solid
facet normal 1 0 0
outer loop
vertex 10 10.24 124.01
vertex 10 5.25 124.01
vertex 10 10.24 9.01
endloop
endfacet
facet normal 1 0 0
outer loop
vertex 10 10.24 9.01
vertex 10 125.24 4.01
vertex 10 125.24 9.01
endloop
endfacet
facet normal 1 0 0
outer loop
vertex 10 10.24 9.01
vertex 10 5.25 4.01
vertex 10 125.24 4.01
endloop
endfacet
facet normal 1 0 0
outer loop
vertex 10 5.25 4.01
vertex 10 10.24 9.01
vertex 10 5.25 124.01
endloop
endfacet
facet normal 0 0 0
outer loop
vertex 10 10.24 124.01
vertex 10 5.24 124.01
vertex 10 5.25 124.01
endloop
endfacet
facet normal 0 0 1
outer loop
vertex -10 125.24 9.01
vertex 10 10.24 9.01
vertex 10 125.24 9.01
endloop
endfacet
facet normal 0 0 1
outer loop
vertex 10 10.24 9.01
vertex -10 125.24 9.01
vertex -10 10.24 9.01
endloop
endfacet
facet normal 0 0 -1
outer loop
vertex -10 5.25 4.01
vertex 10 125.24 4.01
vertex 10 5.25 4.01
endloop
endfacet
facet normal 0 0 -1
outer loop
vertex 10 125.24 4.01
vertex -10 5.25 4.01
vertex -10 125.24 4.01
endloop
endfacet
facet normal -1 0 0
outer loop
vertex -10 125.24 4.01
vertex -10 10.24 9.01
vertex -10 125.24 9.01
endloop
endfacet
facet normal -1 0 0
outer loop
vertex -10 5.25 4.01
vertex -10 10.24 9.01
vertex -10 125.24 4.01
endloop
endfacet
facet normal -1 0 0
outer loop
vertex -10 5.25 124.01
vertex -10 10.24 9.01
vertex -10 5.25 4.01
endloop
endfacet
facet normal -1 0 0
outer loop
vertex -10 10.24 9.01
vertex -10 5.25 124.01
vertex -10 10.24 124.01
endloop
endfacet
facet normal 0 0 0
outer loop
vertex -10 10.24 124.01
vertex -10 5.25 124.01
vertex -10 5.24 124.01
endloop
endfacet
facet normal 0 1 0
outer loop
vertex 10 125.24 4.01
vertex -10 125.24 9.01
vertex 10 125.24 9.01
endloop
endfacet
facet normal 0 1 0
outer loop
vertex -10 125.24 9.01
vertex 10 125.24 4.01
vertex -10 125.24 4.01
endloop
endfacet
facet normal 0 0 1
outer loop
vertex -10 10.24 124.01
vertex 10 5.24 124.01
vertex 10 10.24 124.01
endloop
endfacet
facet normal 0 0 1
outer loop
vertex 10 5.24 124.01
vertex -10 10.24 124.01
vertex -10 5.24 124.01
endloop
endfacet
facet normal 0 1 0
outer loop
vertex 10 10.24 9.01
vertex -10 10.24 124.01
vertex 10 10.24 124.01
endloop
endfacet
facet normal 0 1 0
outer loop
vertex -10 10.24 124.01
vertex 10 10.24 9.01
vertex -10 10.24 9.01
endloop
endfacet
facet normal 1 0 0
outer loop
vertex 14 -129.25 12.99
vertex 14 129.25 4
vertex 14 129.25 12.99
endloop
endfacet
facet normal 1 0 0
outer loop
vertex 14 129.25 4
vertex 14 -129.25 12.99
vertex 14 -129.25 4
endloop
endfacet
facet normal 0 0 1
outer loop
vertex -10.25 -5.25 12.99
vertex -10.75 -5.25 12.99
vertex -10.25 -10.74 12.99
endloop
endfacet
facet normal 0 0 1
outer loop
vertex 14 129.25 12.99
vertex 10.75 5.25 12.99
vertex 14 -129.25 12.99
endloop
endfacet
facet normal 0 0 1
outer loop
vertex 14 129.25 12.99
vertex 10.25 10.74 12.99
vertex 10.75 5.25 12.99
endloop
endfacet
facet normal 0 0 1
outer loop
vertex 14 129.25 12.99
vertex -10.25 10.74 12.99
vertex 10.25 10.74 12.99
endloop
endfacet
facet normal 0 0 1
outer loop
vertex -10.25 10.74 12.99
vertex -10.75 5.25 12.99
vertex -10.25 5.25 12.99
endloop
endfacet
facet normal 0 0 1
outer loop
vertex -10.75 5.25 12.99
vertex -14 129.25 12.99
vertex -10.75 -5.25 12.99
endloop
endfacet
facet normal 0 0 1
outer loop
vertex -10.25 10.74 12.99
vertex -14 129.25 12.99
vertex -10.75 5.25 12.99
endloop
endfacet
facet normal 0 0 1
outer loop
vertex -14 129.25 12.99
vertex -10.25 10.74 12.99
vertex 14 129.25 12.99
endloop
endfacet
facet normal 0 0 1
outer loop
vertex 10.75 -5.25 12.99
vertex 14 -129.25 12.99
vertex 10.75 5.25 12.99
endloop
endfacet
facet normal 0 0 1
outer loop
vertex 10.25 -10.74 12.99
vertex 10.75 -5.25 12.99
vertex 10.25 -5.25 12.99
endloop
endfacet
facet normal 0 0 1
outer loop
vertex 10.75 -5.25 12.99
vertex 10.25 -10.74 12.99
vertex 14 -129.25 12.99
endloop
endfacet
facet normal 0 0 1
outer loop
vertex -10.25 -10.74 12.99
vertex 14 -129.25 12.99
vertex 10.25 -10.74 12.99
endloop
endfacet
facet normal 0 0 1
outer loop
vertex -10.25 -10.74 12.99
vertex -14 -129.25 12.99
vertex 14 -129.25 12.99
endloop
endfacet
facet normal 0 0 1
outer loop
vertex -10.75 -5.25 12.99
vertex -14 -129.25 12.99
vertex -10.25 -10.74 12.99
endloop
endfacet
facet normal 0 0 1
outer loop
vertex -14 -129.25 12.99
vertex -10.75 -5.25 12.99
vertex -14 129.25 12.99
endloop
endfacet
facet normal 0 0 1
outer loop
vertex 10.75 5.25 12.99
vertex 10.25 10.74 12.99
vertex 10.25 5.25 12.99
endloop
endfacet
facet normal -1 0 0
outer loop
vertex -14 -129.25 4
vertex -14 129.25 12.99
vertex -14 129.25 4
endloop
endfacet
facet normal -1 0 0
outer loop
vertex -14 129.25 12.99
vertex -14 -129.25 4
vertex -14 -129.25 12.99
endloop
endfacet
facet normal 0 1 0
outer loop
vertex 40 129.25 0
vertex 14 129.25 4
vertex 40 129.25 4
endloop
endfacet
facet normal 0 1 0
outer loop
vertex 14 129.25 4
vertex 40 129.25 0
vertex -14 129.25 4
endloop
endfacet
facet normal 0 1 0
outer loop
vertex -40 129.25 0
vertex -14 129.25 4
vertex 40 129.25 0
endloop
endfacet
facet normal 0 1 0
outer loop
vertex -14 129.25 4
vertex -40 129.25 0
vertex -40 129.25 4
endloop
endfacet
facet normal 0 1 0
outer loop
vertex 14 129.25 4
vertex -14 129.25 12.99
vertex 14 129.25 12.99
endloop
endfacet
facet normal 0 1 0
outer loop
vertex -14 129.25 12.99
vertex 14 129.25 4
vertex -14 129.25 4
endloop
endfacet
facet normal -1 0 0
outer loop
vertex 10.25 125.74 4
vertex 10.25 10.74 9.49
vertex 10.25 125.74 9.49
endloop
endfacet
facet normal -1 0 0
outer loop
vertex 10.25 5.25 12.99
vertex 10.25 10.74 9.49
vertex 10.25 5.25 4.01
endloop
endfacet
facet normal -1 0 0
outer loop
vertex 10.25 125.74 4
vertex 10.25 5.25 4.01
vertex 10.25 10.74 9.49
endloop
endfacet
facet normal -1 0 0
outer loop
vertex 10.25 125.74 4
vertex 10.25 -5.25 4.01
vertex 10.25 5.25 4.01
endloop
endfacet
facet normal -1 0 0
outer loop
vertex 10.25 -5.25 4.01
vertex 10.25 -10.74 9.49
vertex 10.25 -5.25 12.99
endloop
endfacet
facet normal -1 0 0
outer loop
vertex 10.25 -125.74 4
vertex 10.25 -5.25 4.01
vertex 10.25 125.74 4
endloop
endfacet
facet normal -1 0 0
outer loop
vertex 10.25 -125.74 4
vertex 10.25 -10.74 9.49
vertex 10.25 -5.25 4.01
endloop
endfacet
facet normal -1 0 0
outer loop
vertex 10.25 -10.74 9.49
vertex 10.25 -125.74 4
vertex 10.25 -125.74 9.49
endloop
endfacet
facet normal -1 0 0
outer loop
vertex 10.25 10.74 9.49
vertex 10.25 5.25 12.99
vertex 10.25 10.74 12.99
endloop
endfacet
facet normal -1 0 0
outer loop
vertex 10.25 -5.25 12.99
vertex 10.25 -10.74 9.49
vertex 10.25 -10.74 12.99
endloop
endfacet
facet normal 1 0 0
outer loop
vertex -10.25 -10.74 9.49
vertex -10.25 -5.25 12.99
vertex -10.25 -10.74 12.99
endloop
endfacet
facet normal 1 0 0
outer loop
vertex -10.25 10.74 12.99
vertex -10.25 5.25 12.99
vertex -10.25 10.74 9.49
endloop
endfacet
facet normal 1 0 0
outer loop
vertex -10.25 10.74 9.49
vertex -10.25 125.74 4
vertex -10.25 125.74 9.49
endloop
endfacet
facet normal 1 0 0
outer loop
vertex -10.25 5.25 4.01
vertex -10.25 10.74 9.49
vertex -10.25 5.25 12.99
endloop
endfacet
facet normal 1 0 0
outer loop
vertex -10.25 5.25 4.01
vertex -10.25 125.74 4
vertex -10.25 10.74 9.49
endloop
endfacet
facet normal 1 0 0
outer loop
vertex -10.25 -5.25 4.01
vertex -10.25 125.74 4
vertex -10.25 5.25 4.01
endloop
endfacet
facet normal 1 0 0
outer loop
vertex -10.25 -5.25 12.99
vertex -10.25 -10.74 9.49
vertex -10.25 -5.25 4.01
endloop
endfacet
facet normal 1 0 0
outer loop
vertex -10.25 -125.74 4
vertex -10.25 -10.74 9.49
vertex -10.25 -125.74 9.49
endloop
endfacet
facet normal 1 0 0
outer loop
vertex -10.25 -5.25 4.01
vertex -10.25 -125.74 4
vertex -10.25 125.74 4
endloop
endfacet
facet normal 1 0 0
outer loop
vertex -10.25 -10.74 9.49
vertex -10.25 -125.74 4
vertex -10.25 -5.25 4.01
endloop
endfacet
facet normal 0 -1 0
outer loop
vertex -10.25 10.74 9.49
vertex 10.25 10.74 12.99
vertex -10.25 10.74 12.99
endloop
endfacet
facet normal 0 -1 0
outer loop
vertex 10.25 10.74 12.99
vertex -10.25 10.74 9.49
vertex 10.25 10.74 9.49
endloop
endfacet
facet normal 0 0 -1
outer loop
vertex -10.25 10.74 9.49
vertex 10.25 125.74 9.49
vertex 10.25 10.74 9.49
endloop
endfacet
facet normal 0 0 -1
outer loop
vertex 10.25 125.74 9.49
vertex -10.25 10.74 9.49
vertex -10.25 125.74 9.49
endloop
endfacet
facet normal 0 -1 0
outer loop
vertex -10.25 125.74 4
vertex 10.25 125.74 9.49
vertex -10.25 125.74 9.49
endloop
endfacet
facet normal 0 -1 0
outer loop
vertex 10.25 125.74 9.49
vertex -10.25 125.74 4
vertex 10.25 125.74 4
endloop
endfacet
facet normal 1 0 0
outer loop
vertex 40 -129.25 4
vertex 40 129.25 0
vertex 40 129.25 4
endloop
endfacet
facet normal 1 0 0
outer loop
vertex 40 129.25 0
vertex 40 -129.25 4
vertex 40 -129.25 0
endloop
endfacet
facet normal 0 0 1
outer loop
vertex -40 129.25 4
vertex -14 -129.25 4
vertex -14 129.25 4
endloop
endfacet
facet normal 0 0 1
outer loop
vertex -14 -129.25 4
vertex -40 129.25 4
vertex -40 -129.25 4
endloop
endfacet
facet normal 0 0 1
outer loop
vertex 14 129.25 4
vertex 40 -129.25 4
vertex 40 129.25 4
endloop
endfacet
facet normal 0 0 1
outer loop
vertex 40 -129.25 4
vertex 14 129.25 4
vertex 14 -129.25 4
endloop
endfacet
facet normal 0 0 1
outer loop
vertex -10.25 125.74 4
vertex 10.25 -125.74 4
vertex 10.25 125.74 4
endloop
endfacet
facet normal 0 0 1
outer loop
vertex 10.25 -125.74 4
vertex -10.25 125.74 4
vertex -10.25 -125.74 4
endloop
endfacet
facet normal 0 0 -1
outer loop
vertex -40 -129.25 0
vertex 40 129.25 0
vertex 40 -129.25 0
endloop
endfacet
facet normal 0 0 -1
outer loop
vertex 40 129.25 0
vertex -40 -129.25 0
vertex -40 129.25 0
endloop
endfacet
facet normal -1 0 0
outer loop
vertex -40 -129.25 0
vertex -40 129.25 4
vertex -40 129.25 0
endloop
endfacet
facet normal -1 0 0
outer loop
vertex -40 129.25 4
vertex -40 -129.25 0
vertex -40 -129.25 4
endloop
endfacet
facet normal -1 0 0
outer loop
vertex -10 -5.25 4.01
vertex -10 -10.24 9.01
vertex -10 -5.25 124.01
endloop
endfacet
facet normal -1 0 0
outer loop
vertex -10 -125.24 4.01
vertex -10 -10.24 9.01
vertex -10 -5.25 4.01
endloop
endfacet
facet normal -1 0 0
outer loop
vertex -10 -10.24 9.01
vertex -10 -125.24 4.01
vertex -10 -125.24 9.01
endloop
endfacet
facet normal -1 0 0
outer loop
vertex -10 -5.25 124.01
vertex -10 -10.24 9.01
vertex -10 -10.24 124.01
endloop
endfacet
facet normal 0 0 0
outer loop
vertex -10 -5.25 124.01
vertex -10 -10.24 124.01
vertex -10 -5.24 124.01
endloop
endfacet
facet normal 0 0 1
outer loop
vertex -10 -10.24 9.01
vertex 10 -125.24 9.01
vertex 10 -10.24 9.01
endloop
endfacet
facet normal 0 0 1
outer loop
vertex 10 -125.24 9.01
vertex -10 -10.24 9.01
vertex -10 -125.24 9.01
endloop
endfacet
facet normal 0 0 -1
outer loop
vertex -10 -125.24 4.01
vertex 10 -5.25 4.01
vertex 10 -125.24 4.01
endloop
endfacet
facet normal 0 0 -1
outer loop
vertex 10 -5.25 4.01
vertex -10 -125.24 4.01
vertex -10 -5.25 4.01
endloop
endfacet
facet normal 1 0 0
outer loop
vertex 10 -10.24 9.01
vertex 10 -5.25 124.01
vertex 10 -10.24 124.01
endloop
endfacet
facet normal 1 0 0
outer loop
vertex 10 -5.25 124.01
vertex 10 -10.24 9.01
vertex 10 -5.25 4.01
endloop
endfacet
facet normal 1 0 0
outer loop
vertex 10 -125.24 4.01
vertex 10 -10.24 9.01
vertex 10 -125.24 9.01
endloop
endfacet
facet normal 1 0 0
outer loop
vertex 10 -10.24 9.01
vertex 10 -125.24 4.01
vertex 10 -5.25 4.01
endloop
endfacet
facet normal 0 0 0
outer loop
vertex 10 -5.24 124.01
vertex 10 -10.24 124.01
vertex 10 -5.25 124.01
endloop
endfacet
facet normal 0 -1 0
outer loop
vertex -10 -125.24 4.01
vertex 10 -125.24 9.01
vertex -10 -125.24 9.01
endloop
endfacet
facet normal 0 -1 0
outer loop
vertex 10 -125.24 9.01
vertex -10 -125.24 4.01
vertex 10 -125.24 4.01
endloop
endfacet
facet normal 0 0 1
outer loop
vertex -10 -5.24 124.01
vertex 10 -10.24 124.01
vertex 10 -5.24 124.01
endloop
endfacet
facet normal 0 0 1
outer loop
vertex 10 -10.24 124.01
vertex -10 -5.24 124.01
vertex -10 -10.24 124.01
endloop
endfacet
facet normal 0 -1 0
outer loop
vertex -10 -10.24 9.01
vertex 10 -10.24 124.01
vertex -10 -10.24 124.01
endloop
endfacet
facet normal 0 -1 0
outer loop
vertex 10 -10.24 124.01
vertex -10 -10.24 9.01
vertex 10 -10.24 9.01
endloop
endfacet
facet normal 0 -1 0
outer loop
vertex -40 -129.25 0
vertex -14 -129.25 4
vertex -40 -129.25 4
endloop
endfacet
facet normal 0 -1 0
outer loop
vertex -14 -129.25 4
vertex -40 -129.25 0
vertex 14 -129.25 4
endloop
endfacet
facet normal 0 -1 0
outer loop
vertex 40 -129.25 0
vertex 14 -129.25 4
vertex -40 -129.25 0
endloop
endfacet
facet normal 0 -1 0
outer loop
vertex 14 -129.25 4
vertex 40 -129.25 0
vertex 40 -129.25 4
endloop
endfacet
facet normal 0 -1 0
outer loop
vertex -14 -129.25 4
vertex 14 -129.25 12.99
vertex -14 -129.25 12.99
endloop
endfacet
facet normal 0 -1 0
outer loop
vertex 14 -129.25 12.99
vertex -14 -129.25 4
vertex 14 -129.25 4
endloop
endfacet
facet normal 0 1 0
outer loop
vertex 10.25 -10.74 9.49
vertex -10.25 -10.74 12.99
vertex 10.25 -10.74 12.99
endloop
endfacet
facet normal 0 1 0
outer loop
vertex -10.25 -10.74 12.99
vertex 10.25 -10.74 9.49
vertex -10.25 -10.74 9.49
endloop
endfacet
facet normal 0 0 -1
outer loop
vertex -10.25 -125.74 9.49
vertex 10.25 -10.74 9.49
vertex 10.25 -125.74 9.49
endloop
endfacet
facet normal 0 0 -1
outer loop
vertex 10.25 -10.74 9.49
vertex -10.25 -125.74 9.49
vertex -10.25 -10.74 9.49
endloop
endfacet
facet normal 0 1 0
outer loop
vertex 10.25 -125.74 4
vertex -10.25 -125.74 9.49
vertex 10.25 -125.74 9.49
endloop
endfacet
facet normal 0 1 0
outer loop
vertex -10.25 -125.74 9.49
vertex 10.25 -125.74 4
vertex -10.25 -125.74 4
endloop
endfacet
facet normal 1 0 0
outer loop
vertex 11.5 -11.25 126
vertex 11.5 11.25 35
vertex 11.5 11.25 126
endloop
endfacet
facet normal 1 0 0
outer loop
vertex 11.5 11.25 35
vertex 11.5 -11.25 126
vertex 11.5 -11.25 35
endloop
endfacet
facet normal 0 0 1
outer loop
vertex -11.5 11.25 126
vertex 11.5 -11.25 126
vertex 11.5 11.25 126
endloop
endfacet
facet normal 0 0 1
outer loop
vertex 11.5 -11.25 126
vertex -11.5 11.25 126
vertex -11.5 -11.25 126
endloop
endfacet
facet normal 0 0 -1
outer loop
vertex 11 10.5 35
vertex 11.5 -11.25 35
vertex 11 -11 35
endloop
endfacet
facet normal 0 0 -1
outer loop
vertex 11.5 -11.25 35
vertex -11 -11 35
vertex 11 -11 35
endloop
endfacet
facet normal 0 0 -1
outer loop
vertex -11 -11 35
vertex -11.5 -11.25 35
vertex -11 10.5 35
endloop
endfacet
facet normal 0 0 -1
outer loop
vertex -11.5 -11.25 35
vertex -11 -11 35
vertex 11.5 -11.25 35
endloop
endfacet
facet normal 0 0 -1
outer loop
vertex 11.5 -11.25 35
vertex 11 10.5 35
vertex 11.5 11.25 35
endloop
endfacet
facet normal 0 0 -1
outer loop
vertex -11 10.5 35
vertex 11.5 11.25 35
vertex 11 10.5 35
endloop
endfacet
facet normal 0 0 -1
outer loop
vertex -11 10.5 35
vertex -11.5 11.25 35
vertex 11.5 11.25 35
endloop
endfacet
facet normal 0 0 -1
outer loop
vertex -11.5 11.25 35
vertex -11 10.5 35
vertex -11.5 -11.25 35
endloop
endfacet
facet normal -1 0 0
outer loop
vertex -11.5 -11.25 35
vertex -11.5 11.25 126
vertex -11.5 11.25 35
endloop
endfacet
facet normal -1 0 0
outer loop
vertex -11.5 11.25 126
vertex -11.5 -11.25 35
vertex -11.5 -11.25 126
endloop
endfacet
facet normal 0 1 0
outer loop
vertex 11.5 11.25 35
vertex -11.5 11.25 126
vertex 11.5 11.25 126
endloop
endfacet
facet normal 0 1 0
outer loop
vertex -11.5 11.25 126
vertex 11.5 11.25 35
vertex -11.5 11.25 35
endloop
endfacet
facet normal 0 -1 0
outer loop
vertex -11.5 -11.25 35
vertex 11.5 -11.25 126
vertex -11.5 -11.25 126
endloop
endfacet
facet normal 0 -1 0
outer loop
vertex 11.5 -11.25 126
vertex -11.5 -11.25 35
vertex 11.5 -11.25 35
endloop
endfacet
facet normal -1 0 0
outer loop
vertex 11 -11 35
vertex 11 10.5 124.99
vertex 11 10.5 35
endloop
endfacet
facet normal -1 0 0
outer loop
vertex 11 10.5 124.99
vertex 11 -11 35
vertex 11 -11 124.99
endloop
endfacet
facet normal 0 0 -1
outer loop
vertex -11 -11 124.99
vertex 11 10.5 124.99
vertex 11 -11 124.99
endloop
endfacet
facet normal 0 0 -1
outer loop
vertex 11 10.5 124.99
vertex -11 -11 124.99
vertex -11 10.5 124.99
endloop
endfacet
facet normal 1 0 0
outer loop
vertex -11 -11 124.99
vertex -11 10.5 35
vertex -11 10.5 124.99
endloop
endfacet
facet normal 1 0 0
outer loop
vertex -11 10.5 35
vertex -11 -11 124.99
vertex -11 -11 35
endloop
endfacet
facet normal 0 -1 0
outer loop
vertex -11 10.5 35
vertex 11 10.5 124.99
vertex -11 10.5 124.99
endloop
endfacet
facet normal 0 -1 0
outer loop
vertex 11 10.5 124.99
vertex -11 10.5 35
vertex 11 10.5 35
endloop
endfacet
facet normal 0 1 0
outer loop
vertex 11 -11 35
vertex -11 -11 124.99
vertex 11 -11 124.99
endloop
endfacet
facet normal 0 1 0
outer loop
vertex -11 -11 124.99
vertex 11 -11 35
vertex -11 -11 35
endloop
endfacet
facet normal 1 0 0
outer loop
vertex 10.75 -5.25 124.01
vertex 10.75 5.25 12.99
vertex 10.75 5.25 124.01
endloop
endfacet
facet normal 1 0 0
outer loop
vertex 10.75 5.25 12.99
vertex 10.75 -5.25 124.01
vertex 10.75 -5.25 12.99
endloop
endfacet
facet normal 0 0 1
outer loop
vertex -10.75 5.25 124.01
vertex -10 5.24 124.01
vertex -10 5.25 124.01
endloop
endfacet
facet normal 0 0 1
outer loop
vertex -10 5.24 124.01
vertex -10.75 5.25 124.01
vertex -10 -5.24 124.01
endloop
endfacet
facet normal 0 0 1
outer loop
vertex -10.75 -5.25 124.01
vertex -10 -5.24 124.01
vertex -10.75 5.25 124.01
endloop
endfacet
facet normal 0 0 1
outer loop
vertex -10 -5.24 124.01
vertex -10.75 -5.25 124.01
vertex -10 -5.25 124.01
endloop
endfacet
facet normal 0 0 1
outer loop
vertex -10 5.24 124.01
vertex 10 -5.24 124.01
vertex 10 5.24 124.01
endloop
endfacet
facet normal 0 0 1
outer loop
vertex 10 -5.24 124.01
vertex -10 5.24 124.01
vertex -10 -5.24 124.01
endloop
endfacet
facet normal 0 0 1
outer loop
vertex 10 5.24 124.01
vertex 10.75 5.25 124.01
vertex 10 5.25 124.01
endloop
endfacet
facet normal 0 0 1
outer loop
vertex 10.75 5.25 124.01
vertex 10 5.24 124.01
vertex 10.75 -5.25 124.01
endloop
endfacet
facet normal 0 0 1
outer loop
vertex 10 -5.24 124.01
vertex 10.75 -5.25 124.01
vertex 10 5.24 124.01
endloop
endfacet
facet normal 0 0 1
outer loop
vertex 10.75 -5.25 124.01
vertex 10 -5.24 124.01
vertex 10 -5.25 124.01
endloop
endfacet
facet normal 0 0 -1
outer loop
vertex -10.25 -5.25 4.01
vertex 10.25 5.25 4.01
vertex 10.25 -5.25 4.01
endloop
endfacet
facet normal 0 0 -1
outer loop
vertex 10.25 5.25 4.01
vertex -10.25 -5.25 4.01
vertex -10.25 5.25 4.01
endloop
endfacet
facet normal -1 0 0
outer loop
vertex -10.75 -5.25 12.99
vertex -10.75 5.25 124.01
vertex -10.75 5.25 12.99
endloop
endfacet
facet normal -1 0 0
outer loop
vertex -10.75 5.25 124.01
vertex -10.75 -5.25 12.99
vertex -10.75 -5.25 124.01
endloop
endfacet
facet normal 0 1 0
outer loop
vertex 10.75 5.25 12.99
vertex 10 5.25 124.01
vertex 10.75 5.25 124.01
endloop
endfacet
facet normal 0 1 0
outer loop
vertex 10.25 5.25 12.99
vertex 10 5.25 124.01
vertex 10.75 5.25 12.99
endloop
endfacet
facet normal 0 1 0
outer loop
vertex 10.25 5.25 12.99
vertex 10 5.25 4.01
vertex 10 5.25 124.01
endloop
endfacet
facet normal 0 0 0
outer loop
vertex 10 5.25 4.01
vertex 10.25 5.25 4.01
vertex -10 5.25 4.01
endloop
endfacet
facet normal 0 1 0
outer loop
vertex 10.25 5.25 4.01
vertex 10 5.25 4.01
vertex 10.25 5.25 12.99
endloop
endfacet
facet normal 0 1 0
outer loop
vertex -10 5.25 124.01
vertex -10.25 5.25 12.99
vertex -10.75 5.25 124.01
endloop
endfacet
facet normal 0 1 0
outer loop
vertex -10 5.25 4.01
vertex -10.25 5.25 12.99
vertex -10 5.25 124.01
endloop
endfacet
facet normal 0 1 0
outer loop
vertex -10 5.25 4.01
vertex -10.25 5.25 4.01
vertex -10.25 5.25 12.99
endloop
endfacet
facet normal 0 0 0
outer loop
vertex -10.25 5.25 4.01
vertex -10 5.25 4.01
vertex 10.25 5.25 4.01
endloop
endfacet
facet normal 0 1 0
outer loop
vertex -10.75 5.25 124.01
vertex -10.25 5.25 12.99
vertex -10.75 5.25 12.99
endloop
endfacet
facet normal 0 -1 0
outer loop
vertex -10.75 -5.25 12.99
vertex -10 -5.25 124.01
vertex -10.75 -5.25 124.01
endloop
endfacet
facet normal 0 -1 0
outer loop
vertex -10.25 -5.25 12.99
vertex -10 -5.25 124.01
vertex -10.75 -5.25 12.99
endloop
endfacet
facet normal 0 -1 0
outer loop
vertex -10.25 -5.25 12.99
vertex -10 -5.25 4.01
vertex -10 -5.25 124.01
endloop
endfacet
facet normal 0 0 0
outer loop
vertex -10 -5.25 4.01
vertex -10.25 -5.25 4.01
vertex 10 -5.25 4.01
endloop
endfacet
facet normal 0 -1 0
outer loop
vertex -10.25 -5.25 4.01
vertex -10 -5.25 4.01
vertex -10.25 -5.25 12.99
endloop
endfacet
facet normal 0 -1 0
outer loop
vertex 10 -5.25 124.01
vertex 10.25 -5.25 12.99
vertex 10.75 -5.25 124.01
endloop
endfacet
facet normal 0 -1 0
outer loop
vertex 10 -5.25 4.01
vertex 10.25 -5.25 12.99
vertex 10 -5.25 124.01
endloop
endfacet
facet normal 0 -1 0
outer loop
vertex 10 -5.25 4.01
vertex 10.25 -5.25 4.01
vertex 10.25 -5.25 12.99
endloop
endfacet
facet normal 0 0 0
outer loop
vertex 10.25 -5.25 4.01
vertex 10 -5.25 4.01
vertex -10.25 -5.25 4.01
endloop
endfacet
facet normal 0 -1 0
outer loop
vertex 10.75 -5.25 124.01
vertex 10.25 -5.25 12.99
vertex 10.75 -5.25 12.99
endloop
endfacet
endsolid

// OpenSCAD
// file: monitor.scad
include <config.scad>;

module monitor_socket() {
    color([1, 1, 1, 0.6]) {
        difference() {
            // Block incl. walls
            wx_outer = monitor_socket_widthx + monitor_socket_thickness;
            wy_outer = monitor_socket_widthy + monitor_socket_thickness;
            translate([
                -wx_outer/2,
                -wy_outer/2,
                0
                ])
            cube([
                wx_outer,
                wy_outer,
                monitor_socket_height + monitor_socket_thickness
                ]);

            // Hole
            translate([
                -monitor_socket_widthx/2,
                -monitor_socket_widthx/2,
                -nothing
                ])
            cube([
                monitor_socket_widthx,
                monitor_socket_widthy,
                monitor_socket_height,
                ]);
        }
    }
}

monitor_socket();
// file: config.scad
// Render options
$fn = 500;
nothing = 0.01;

// Monitor parameters
monitor_width = 0;
monitor_height = 0;
monitor_thickness = 0;
monitor_socket_widthx = 22;
monitor_socket_widthy = 21.5;
monitor_socket_height = 90;
monitor_socket_thickness = 1;

// Metal support
angle_lengthx = 120;
angle_lengthy = 120;
angle_width = 20;
angle_thickness = 5;

// Foot parameters
foot_bottom_height = 4;

// Spacer
spacer_width = monitor_socket_widthx - 0.5;
spacer_height = angle_lengthy;
spacer_thickness = monitor_socket_widthy - 2*angle_thickness - 2*0.5;

// More foot parameters
foot_anglecap_thickness = 4;
foot_anglecap_width = angle_width + 2*foot_anglecap_thickness;
foot_anglecap_height = angle_thickness + foot_anglecap_thickness;
foot_anglecap_length = spacer_thickness/2 + angle_lengthx + foot_anglecap_thickness;
foot_bottom_width = 80;
foot_bottom_length = foot_anglecap_thickness + angle_lengthx + spacer_thickness/2;

// Where to insert the angle into the foot
insertion_hole_width = angle_width + 0.5;
insertion_hole_length = angle_thickness + spacer_thickness/2 + 0.5;
pocket_width = angle_width + 0.5;
pocket_height = angle_thickness + 0.5;
pocket_length = foot_bottom_length - foot_anglecap_thickness + 0.5;
// main file
include <config.scad>;
use <monitor.scad>;


module angle() {
    color([0.5, 0.8, 0, 0.7]) {
        // Bottom half
        translate([
            -angle_width/2,
            0,
            0
            ])
        cube([
            angle_width,
            angle_lengthx,
            angle_thickness
            ]);

        // Upright half
        translate([
            -angle_width/2,
            0,
            0
            ])
        cube([
            angle_width,
            angle_thickness,
            angle_lengthy
            ]);
    }
}

module spacer() {
    color([0.5, 0.2, 0.7, 0.9])
    translate([
        -spacer_width/2,
        -spacer_thickness/2,
        0
        ])
    cube([
        spacer_width,
        spacer_thickness,
        spacer_height
        ]);
}

module foot() {
    color([0.1, 0.1, 0.8, 0.6]) {
        // Base plate
        translate([
            -foot_bottom_width/2,
            0,
            0
            ])
        cube([
            foot_bottom_width,
            foot_bottom_length,
            foot_bottom_height
            ]);

        // Angle encapsulator
        difference() {
            translate([
                -foot_anglecap_width/2,
                0,
                foot_bottom_height - nothing
                ])
            cube([
                foot_anglecap_width,
                foot_anglecap_length,
                foot_anglecap_height
                ]);

            // Insert angle here
            translate([
                - insertion_hole_width/2,
                - nothing,
                foot_bottom_height - nothing
                ])
            cube([
                insertion_hole_width,
                insertion_hole_length,
                foot_anglecap_height + nothing
                ]);

            // Pocket for the angle
            translate([
                - pocket_width/2,
                - nothing,
                foot_bottom_height - nothing
                ])
            cube([
                pocket_width,
                pocket_length,
                pocket_height
                ]);
        }
    }
}


for (a = [0:180:180]) {
    rotate(a) {
        translate([
            0,
            spacer_thickness/2 - nothing,
            foot_bottom_height + nothing
            ])
        angle();
        foot();
    }
}
translate([
    0,
    0,
    foot_bottom_height + nothing
    ])
spacer();
translate([0, 0, 35])
monitor_socket();
